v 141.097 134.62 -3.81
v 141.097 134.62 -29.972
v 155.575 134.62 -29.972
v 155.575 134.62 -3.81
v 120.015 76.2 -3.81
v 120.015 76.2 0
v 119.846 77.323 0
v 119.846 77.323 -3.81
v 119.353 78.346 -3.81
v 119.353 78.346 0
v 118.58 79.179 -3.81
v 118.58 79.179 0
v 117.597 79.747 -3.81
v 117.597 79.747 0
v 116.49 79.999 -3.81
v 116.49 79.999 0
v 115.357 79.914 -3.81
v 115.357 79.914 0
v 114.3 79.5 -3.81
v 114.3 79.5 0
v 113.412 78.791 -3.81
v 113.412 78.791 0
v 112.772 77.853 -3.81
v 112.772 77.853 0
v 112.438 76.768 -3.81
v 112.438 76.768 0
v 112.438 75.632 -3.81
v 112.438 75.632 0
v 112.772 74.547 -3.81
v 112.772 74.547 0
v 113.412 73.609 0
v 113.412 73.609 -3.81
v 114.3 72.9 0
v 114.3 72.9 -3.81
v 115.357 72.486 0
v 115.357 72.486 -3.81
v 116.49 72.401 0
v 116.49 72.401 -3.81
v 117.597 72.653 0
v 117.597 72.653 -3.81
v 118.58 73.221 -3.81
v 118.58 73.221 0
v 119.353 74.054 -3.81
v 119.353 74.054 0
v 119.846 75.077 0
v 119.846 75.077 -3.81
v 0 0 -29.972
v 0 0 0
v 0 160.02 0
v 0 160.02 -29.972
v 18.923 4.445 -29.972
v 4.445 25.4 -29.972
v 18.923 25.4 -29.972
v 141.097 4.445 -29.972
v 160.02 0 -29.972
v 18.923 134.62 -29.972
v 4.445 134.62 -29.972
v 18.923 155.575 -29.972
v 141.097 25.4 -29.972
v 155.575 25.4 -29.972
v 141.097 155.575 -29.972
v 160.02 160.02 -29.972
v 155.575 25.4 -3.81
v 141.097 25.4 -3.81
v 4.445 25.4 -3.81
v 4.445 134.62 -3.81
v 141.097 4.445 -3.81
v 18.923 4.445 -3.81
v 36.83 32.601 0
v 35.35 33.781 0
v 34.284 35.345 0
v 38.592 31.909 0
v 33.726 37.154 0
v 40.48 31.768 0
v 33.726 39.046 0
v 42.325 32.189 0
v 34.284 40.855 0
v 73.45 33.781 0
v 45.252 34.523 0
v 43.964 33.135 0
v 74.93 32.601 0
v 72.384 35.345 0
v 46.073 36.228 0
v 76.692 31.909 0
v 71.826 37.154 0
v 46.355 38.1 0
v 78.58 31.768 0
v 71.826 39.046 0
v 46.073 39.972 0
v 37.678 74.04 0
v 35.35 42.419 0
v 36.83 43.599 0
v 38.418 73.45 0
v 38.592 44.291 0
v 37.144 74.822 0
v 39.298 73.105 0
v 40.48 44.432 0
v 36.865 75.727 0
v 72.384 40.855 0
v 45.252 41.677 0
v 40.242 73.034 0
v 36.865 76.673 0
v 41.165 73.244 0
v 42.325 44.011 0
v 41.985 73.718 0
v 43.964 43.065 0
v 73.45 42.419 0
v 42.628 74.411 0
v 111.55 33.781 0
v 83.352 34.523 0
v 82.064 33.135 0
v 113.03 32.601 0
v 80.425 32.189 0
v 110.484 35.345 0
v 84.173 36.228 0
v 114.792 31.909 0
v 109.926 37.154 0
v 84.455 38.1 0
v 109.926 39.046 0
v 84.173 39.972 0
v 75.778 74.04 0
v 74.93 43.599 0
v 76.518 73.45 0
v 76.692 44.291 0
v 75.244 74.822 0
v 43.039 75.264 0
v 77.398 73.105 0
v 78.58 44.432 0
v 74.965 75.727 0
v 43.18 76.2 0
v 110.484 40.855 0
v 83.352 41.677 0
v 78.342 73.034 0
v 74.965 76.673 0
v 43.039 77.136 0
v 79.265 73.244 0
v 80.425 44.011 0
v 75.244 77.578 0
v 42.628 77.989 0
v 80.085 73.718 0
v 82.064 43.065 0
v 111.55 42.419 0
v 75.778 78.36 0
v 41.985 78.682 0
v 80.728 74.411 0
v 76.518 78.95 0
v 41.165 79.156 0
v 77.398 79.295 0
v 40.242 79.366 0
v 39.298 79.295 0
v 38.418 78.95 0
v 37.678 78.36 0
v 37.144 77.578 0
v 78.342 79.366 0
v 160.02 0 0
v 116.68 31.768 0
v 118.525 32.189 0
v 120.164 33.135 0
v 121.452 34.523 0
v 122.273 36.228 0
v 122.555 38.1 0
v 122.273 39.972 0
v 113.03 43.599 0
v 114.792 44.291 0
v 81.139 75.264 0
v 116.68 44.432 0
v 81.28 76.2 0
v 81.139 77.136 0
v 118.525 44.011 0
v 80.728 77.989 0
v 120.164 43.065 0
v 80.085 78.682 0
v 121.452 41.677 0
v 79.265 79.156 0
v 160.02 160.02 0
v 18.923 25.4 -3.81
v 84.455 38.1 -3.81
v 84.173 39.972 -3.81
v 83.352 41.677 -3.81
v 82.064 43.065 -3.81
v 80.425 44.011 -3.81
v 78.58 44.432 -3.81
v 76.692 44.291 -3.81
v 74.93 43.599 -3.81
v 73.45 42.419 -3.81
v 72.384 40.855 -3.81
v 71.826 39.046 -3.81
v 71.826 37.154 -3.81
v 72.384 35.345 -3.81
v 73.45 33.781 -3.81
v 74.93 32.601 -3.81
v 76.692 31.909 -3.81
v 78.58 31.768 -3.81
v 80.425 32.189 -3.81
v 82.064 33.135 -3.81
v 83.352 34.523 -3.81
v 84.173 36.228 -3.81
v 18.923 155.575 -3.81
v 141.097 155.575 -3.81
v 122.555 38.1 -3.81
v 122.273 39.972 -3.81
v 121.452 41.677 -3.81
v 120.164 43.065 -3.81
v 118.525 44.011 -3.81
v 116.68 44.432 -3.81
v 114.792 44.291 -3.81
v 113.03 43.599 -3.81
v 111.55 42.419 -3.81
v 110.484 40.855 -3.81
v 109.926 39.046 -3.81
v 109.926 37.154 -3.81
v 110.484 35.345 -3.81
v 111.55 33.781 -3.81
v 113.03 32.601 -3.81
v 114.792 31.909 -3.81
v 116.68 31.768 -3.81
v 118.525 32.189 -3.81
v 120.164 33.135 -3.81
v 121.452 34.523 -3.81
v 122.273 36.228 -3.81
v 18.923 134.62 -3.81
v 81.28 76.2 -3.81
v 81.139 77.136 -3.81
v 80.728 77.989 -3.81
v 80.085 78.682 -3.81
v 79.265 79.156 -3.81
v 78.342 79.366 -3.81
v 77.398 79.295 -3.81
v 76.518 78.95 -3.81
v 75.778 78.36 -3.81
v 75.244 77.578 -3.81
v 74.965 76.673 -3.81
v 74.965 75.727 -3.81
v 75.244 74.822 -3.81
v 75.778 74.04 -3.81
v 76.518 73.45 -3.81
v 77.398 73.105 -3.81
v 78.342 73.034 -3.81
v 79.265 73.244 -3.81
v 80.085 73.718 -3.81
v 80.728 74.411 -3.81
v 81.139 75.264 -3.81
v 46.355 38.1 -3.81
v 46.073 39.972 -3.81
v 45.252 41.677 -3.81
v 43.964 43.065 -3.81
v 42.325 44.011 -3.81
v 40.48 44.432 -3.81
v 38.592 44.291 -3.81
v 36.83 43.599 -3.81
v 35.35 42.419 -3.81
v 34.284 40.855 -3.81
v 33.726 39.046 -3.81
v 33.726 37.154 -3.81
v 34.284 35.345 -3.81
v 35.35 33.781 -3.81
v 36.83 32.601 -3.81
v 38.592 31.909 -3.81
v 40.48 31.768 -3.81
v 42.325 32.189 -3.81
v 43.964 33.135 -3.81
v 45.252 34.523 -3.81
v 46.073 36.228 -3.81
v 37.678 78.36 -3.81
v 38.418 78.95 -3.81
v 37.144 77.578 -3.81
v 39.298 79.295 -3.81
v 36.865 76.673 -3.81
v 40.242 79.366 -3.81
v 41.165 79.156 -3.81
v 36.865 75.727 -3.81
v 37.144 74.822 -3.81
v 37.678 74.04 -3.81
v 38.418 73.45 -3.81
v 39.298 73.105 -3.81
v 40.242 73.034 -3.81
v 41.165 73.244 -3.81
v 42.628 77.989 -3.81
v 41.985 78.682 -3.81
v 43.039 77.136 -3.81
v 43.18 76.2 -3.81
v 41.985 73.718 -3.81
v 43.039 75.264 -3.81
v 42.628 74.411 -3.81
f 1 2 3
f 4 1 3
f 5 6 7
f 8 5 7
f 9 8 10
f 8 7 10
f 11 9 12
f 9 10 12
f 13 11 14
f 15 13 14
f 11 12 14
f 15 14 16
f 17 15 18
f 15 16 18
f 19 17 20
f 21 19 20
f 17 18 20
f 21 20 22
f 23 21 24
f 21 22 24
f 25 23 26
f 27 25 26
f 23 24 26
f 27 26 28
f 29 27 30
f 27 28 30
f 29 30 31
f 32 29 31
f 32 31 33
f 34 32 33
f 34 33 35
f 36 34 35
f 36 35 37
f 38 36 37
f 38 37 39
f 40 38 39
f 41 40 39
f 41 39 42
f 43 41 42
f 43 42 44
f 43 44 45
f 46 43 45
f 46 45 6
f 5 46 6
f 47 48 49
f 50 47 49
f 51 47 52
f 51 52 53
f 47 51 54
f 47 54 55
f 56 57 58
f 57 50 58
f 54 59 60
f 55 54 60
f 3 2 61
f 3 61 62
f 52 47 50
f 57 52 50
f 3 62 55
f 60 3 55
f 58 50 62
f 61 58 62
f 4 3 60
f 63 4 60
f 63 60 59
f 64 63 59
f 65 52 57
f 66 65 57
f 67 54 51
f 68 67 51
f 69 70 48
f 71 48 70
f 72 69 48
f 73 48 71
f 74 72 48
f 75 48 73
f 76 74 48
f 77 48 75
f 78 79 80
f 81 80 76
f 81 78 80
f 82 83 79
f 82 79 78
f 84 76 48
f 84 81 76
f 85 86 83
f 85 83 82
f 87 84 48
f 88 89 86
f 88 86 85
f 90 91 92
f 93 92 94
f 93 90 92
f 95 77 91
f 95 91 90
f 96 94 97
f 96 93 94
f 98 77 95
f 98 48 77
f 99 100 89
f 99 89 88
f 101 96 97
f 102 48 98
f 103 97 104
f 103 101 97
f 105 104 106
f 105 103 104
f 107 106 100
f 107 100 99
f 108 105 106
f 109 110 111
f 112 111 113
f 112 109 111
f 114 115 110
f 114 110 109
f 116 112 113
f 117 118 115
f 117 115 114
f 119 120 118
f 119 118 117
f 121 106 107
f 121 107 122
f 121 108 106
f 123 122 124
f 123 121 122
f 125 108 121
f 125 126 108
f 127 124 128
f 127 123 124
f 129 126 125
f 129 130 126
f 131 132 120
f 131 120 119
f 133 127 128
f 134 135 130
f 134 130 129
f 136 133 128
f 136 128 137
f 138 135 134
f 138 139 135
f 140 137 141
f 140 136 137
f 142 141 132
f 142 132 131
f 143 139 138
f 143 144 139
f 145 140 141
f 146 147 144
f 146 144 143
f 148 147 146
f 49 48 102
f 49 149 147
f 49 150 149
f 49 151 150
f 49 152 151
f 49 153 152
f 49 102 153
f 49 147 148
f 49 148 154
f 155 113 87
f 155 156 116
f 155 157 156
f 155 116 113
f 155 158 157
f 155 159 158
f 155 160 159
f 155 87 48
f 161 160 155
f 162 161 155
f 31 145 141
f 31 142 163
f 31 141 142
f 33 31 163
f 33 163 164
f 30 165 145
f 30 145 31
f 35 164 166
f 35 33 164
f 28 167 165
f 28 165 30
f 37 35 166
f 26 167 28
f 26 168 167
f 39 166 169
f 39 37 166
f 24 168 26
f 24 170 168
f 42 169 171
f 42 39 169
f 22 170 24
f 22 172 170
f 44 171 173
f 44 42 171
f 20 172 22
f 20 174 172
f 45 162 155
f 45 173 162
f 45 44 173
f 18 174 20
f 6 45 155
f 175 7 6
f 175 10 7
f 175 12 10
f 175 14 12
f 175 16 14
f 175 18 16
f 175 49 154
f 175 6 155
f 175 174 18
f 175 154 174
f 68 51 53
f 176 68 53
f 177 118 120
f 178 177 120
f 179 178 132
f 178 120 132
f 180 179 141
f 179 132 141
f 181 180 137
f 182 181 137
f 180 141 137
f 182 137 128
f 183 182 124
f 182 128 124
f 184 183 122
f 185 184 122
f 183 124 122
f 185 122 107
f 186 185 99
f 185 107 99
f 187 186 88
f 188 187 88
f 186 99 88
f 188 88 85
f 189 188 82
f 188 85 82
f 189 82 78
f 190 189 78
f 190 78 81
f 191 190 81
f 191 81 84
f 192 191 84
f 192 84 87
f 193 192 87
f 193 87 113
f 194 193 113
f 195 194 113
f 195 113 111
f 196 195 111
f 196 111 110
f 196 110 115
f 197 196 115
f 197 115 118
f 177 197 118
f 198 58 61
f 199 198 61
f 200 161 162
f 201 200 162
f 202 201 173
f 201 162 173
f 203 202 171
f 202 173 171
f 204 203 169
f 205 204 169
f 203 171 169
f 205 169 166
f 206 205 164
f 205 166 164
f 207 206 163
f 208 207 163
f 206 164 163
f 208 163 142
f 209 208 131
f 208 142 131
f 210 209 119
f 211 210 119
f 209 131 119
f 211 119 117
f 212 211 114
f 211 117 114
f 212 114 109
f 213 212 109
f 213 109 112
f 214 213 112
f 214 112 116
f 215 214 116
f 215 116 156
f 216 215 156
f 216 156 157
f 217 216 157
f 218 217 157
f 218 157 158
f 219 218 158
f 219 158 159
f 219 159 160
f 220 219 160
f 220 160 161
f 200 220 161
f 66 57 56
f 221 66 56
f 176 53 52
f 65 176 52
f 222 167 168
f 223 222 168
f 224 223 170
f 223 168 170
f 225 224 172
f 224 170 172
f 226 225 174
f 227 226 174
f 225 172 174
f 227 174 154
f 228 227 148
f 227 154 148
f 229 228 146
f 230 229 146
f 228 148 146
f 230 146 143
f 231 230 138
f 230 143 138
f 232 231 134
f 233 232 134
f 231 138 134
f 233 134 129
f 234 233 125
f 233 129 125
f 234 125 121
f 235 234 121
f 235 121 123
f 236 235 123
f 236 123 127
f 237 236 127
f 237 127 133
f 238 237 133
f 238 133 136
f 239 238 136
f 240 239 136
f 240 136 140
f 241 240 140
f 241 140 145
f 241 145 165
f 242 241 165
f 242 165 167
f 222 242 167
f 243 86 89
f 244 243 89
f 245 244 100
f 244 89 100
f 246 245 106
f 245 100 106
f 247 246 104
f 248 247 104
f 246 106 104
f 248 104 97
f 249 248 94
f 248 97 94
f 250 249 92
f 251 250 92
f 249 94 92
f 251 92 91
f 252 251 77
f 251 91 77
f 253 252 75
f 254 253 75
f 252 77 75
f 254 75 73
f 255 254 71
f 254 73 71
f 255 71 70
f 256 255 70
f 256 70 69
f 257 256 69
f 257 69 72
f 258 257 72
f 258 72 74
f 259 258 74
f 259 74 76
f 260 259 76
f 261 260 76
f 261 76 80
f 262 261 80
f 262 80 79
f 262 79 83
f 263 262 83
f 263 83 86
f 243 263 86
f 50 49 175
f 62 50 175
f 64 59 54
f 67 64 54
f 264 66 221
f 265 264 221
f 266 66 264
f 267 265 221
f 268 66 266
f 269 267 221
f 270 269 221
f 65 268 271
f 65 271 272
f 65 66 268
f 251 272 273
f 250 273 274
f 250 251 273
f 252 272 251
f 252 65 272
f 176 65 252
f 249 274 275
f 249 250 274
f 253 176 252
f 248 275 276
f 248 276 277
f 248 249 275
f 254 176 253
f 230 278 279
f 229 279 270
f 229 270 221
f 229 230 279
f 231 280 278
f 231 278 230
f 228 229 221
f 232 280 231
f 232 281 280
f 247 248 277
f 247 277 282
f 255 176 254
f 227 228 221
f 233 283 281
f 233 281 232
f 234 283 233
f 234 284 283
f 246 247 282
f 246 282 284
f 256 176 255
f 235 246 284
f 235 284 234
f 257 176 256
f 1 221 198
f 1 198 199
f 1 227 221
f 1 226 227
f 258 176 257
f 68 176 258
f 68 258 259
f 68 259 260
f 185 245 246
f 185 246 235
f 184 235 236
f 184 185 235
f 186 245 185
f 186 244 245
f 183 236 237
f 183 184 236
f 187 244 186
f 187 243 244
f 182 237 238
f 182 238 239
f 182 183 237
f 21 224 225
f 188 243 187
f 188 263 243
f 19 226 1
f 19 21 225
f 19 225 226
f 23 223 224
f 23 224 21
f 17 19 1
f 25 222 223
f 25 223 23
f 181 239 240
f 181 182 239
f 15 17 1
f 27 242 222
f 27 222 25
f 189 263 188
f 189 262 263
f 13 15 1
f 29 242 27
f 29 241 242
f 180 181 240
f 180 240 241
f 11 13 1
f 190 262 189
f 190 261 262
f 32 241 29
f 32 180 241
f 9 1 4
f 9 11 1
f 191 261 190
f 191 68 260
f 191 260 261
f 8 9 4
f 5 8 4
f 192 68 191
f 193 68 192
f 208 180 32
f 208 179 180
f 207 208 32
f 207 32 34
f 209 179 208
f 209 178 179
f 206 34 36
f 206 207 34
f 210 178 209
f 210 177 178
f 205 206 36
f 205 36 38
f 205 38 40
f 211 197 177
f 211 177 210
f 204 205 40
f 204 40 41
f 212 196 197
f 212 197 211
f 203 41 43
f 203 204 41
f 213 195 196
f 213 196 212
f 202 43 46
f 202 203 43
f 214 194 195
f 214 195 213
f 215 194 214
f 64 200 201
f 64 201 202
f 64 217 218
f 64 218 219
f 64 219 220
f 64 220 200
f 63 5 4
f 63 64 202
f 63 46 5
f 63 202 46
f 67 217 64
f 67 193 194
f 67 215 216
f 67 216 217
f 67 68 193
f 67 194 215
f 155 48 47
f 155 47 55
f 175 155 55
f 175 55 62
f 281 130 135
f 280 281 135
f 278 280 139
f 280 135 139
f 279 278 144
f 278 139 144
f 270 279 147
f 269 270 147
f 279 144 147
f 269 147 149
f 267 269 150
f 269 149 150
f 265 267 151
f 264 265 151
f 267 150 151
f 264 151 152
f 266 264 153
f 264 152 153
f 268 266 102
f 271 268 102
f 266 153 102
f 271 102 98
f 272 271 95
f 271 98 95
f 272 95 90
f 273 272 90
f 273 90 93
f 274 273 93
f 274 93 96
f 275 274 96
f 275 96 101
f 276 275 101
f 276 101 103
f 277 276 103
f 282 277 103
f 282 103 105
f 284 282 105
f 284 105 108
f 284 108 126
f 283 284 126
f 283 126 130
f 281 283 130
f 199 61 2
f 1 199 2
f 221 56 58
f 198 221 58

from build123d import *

# Parameters (mm, degrees)
F0_W     = 160.02
F0_H     = 160.02
F1_DEPTH = 29.972
F3_DEPTH = 26.162
F4_R     = 6.35
F4_R_2   = 3.81
F4_R_3   = 3.175
F5_DEPTH = 6.35


with BuildPart() as f1:
    # F0 (on Top) → F1 (new body)
    with BuildSketch(Plane.XY):
        with Locations((80.01, 80.01)):
            Rectangle(F0_W, F0_H)
    extrude(amount=-F1_DEPTH)

    # F2 (on face) → F3 (cut)
    with BuildSketch(Plane(origin=(0, 0, -29.972), x_dir=(1, 0, 0), z_dir=(0, 0, -1))):
        Polygon((18.923, -25.4), (4.445, -25.4), (4.445, -134.62), (18.923, -134.62), (18.923, -155.575), (141.097, -155.575), (141.097, -134.62), (155.575, -134.62), (155.575, -25.4), (141.097, -25.4), (141.097, -4.445), (18.923, -4.445), align=None)
    extrude(amount=-F3_DEPTH, mode=Mode.SUBTRACT)

    # F4 (on face) → F5 (cut)
    with BuildSketch(Plane.XY):
        with Locations((40.005, 38.1)):
            Circle(F4_R)
        with Locations((78.105, 38.1)):
            Circle(F4_R)
        with Locations((116.205, 38.1)):
            Circle(F4_R)
        with Locations((116.205, 76.2)):
            Circle(F4_R_2)
        with Locations((78.105, 76.2)):
            Circle(F4_R_3)
        with Locations((40.005, 76.2)):
            Circle(F4_R_3)
    extrude(amount=-F5_DEPTH, mode=Mode.SUBTRACT)


solid = f1.part
